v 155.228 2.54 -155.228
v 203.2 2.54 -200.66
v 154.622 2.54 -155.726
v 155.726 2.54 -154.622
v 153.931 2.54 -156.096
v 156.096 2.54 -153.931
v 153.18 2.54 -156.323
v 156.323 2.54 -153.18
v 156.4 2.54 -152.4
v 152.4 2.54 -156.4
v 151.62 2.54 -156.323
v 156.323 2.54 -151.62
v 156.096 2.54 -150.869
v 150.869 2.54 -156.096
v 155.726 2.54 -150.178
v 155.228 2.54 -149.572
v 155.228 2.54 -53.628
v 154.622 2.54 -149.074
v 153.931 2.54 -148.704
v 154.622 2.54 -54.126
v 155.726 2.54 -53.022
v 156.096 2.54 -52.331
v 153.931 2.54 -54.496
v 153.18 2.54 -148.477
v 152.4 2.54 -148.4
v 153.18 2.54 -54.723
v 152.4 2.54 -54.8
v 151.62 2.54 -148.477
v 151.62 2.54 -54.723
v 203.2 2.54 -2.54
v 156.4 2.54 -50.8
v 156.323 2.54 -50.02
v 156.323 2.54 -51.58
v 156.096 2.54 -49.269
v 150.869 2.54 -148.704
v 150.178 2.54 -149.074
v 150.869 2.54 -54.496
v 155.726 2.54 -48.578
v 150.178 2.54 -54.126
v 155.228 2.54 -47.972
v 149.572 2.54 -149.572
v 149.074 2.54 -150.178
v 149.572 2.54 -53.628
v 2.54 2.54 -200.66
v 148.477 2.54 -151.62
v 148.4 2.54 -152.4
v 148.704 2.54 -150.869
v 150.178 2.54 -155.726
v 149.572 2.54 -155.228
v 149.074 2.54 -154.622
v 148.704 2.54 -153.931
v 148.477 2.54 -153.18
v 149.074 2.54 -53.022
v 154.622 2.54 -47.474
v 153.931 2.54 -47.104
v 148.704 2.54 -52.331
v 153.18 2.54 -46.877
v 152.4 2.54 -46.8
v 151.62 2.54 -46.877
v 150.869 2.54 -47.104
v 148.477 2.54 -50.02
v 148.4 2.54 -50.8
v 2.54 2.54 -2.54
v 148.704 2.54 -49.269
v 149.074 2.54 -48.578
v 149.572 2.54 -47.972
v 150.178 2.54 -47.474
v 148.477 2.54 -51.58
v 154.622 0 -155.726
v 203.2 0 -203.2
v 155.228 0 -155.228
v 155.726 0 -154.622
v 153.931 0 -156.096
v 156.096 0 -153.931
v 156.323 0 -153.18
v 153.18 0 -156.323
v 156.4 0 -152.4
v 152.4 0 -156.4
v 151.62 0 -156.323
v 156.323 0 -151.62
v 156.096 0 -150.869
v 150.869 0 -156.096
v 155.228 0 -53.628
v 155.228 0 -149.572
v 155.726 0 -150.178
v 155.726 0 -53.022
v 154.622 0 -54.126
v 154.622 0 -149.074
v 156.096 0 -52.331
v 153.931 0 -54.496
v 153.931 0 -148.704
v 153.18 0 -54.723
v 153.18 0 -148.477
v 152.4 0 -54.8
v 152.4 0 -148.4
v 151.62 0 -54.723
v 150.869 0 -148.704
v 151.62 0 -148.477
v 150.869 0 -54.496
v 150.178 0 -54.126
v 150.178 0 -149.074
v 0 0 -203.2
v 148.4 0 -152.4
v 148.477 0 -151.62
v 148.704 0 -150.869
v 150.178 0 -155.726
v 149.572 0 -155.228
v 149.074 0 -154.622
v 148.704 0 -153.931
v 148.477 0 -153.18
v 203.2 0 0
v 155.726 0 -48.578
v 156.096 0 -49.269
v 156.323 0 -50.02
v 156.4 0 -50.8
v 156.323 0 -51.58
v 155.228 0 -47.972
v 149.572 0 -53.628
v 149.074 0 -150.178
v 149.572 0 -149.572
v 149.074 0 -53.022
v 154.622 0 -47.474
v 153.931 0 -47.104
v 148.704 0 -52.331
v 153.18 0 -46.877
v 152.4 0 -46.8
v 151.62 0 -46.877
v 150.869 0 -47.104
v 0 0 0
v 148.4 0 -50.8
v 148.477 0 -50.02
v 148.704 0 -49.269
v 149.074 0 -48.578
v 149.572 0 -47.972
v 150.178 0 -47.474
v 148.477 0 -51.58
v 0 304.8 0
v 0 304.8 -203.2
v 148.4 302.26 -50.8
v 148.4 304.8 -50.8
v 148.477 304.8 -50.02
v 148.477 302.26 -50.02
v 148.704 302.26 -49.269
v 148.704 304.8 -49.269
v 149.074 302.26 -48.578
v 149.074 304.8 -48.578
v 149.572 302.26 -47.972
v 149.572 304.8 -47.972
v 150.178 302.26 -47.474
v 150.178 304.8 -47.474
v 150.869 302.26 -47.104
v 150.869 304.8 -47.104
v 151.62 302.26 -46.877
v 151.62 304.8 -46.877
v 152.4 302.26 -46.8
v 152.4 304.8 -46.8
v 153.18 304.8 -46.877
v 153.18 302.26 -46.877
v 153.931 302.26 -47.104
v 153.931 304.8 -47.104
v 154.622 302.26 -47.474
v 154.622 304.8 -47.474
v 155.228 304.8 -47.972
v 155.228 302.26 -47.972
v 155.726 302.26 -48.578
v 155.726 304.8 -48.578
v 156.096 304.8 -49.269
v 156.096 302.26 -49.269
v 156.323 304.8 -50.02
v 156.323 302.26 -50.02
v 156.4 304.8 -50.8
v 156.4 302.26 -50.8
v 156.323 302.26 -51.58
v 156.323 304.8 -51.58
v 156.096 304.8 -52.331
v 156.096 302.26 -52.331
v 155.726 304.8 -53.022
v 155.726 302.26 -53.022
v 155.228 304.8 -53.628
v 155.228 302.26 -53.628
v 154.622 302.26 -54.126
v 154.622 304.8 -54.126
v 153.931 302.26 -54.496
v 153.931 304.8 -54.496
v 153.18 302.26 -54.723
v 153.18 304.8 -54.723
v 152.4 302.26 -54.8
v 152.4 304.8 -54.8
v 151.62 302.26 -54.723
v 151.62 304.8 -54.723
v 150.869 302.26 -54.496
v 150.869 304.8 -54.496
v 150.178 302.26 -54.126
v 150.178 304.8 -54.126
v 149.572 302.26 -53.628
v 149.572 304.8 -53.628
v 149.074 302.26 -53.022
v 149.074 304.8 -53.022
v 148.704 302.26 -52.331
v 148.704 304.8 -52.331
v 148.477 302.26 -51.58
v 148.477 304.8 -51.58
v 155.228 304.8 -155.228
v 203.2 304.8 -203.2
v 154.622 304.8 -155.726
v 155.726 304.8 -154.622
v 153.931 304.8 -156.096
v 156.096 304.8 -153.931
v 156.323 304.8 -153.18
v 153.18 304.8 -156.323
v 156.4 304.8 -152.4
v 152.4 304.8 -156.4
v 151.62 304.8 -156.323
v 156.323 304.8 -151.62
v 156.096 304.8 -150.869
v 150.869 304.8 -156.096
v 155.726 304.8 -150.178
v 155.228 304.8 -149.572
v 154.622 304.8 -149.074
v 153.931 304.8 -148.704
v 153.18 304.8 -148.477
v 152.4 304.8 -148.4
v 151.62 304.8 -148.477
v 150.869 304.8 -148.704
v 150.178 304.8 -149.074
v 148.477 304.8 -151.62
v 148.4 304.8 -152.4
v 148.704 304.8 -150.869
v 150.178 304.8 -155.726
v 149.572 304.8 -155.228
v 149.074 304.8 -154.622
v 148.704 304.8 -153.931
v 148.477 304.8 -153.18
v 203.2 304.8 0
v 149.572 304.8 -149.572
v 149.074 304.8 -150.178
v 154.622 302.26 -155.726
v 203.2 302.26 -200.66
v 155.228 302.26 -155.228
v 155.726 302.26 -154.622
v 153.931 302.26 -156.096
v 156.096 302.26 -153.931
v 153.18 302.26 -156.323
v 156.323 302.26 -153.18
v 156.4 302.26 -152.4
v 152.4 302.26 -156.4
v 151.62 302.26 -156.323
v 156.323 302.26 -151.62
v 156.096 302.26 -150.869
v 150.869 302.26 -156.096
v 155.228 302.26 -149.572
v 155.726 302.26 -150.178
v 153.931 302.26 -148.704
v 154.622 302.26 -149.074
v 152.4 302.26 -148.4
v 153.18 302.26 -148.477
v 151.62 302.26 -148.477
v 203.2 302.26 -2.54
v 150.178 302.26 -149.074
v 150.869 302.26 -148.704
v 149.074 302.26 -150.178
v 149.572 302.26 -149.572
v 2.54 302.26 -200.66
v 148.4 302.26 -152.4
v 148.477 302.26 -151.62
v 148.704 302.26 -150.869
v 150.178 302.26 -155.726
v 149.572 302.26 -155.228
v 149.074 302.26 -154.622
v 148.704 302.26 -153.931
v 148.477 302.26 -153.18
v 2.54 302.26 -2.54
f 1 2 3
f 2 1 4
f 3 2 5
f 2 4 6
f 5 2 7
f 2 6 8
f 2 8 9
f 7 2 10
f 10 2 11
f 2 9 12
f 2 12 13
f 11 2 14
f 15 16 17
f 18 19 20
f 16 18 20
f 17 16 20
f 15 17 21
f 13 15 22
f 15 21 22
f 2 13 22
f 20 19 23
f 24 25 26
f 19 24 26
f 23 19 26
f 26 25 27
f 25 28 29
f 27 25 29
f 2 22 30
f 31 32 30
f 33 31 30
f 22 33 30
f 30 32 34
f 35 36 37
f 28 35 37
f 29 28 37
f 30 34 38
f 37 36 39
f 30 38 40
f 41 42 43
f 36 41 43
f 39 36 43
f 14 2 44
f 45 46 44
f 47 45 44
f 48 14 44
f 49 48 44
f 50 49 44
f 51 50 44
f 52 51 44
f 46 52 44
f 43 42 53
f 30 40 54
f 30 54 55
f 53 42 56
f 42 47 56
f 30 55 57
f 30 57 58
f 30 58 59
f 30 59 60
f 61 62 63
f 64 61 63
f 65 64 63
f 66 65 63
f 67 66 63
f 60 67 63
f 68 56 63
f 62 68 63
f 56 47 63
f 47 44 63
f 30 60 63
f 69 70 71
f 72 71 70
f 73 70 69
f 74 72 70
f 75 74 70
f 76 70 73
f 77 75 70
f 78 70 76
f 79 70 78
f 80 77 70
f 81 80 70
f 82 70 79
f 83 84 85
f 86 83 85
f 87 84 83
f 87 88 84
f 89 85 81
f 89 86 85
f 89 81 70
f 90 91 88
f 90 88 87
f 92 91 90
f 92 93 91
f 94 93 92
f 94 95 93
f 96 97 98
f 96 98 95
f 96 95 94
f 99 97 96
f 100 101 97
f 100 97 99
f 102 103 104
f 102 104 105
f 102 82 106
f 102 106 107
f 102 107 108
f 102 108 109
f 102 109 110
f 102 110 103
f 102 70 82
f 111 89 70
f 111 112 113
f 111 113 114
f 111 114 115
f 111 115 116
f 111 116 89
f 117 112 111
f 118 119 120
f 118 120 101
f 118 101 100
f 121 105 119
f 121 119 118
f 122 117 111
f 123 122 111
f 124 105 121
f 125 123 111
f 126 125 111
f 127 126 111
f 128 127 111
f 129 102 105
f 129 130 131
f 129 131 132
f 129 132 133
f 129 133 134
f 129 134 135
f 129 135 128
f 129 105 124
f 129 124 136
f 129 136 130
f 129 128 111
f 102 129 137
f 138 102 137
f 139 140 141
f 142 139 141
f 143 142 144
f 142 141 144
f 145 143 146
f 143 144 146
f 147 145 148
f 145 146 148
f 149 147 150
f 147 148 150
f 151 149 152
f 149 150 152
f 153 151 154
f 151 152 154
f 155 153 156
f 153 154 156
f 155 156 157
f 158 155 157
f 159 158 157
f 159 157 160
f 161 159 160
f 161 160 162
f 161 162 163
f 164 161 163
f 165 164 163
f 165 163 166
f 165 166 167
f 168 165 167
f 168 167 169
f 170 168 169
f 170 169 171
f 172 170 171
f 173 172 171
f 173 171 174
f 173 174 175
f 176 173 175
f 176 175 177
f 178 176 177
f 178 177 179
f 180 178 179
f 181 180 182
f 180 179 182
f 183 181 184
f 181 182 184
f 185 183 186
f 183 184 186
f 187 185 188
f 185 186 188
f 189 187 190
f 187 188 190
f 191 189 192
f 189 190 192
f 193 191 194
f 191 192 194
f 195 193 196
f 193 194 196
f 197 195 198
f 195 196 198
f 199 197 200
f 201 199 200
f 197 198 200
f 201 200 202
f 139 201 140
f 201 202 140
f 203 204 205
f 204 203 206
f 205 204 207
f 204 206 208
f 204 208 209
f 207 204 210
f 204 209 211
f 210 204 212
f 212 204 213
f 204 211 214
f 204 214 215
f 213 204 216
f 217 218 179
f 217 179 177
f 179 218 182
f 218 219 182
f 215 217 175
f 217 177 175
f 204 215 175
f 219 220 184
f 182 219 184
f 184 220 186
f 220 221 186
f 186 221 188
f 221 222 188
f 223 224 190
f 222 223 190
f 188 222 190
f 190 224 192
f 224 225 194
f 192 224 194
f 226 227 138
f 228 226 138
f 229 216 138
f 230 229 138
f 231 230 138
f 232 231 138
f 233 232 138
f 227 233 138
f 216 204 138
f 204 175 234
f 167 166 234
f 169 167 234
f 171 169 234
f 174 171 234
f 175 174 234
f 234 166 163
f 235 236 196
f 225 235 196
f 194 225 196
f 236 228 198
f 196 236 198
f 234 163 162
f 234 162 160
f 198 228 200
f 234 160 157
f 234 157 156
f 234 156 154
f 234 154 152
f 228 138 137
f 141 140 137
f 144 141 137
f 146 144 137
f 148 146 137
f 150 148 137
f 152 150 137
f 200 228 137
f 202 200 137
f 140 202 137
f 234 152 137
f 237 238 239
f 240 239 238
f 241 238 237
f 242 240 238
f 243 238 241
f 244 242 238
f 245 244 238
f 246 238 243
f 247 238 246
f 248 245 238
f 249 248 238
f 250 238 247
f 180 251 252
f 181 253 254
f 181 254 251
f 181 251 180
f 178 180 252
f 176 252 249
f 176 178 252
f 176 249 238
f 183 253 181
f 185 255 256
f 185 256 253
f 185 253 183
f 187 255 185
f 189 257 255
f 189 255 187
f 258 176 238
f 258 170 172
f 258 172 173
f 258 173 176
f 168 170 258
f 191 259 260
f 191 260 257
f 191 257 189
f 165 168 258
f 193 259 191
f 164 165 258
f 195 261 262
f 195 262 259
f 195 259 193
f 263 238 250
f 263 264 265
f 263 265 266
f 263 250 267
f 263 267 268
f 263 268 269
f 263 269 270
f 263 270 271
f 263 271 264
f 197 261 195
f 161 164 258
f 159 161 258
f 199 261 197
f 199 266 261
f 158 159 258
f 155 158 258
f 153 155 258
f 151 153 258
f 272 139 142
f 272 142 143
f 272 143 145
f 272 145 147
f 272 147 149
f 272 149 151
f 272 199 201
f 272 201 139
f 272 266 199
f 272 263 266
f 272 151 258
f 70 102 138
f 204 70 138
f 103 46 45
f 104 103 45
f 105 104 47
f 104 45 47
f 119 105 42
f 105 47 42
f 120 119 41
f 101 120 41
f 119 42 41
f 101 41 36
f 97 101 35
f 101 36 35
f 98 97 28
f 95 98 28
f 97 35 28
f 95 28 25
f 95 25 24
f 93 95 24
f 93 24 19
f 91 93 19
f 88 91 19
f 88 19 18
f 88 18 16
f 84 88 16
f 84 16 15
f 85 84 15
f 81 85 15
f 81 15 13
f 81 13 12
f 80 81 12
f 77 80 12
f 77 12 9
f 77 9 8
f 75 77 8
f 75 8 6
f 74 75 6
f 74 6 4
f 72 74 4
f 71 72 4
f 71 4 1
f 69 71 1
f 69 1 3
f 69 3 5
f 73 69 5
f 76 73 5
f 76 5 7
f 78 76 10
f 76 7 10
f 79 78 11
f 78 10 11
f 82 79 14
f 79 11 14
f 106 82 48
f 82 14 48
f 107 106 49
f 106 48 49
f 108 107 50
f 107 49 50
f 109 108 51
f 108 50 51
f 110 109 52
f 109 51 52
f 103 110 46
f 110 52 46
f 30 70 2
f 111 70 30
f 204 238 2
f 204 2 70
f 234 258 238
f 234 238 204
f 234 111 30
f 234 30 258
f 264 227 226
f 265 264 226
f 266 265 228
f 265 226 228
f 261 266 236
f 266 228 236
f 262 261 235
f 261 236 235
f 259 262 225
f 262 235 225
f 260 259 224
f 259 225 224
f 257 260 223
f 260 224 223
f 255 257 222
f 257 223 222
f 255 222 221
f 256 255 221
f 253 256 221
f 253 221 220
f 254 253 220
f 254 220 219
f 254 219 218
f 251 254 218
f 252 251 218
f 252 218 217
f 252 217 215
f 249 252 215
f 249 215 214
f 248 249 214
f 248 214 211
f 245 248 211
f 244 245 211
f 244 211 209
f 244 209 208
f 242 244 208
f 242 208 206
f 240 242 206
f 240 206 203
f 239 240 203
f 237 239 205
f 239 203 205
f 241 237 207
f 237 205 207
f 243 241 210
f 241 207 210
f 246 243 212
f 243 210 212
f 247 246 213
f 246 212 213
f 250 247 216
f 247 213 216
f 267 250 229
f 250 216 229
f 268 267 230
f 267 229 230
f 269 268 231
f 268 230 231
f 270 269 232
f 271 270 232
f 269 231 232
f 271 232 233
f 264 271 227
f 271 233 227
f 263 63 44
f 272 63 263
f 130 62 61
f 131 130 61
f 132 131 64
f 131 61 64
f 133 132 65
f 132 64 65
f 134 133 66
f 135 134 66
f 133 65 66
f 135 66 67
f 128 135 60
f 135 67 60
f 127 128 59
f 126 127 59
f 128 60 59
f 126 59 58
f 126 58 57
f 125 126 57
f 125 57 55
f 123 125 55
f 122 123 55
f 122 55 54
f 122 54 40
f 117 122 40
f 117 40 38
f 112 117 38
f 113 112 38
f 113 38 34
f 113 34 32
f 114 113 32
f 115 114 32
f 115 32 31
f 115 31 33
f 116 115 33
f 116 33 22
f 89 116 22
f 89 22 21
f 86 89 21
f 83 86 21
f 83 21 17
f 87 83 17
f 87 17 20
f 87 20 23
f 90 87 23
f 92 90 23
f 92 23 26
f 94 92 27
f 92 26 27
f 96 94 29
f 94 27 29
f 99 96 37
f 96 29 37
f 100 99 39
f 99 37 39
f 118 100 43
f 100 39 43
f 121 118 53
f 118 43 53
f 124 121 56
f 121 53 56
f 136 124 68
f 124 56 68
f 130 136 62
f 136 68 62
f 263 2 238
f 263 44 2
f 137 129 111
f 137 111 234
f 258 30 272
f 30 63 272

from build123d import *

# Parameters (mm, degrees)
F0_W     = 304.8
F0_H     = 203.2
F1_DEPTH = 203.2
F2_T     = -2.54
F4_D     = 8


with BuildPart() as f1:
    # F0 (on Right) → F1 (new body)
    with BuildSketch(Plane.YZ):
        with Locations((152.4, -101.6)):
            Rectangle(F0_W, F0_H)
    extrude(amount=F1_DEPTH)

    # F2
    f2_openings = [f1.faces().sort_by_distance(p)[0] for p in [
        (203.2, 152.4, -101.6),
    ]]
    offset(amount=F2_T, openings=f2_openings)

    # F4 (through all)
    with Locations(Plane.XZ):
        with Locations((152.4, -50.8), (152.4, -152.4)):
            Hole(F4_D / 2)


solid = f1.part
